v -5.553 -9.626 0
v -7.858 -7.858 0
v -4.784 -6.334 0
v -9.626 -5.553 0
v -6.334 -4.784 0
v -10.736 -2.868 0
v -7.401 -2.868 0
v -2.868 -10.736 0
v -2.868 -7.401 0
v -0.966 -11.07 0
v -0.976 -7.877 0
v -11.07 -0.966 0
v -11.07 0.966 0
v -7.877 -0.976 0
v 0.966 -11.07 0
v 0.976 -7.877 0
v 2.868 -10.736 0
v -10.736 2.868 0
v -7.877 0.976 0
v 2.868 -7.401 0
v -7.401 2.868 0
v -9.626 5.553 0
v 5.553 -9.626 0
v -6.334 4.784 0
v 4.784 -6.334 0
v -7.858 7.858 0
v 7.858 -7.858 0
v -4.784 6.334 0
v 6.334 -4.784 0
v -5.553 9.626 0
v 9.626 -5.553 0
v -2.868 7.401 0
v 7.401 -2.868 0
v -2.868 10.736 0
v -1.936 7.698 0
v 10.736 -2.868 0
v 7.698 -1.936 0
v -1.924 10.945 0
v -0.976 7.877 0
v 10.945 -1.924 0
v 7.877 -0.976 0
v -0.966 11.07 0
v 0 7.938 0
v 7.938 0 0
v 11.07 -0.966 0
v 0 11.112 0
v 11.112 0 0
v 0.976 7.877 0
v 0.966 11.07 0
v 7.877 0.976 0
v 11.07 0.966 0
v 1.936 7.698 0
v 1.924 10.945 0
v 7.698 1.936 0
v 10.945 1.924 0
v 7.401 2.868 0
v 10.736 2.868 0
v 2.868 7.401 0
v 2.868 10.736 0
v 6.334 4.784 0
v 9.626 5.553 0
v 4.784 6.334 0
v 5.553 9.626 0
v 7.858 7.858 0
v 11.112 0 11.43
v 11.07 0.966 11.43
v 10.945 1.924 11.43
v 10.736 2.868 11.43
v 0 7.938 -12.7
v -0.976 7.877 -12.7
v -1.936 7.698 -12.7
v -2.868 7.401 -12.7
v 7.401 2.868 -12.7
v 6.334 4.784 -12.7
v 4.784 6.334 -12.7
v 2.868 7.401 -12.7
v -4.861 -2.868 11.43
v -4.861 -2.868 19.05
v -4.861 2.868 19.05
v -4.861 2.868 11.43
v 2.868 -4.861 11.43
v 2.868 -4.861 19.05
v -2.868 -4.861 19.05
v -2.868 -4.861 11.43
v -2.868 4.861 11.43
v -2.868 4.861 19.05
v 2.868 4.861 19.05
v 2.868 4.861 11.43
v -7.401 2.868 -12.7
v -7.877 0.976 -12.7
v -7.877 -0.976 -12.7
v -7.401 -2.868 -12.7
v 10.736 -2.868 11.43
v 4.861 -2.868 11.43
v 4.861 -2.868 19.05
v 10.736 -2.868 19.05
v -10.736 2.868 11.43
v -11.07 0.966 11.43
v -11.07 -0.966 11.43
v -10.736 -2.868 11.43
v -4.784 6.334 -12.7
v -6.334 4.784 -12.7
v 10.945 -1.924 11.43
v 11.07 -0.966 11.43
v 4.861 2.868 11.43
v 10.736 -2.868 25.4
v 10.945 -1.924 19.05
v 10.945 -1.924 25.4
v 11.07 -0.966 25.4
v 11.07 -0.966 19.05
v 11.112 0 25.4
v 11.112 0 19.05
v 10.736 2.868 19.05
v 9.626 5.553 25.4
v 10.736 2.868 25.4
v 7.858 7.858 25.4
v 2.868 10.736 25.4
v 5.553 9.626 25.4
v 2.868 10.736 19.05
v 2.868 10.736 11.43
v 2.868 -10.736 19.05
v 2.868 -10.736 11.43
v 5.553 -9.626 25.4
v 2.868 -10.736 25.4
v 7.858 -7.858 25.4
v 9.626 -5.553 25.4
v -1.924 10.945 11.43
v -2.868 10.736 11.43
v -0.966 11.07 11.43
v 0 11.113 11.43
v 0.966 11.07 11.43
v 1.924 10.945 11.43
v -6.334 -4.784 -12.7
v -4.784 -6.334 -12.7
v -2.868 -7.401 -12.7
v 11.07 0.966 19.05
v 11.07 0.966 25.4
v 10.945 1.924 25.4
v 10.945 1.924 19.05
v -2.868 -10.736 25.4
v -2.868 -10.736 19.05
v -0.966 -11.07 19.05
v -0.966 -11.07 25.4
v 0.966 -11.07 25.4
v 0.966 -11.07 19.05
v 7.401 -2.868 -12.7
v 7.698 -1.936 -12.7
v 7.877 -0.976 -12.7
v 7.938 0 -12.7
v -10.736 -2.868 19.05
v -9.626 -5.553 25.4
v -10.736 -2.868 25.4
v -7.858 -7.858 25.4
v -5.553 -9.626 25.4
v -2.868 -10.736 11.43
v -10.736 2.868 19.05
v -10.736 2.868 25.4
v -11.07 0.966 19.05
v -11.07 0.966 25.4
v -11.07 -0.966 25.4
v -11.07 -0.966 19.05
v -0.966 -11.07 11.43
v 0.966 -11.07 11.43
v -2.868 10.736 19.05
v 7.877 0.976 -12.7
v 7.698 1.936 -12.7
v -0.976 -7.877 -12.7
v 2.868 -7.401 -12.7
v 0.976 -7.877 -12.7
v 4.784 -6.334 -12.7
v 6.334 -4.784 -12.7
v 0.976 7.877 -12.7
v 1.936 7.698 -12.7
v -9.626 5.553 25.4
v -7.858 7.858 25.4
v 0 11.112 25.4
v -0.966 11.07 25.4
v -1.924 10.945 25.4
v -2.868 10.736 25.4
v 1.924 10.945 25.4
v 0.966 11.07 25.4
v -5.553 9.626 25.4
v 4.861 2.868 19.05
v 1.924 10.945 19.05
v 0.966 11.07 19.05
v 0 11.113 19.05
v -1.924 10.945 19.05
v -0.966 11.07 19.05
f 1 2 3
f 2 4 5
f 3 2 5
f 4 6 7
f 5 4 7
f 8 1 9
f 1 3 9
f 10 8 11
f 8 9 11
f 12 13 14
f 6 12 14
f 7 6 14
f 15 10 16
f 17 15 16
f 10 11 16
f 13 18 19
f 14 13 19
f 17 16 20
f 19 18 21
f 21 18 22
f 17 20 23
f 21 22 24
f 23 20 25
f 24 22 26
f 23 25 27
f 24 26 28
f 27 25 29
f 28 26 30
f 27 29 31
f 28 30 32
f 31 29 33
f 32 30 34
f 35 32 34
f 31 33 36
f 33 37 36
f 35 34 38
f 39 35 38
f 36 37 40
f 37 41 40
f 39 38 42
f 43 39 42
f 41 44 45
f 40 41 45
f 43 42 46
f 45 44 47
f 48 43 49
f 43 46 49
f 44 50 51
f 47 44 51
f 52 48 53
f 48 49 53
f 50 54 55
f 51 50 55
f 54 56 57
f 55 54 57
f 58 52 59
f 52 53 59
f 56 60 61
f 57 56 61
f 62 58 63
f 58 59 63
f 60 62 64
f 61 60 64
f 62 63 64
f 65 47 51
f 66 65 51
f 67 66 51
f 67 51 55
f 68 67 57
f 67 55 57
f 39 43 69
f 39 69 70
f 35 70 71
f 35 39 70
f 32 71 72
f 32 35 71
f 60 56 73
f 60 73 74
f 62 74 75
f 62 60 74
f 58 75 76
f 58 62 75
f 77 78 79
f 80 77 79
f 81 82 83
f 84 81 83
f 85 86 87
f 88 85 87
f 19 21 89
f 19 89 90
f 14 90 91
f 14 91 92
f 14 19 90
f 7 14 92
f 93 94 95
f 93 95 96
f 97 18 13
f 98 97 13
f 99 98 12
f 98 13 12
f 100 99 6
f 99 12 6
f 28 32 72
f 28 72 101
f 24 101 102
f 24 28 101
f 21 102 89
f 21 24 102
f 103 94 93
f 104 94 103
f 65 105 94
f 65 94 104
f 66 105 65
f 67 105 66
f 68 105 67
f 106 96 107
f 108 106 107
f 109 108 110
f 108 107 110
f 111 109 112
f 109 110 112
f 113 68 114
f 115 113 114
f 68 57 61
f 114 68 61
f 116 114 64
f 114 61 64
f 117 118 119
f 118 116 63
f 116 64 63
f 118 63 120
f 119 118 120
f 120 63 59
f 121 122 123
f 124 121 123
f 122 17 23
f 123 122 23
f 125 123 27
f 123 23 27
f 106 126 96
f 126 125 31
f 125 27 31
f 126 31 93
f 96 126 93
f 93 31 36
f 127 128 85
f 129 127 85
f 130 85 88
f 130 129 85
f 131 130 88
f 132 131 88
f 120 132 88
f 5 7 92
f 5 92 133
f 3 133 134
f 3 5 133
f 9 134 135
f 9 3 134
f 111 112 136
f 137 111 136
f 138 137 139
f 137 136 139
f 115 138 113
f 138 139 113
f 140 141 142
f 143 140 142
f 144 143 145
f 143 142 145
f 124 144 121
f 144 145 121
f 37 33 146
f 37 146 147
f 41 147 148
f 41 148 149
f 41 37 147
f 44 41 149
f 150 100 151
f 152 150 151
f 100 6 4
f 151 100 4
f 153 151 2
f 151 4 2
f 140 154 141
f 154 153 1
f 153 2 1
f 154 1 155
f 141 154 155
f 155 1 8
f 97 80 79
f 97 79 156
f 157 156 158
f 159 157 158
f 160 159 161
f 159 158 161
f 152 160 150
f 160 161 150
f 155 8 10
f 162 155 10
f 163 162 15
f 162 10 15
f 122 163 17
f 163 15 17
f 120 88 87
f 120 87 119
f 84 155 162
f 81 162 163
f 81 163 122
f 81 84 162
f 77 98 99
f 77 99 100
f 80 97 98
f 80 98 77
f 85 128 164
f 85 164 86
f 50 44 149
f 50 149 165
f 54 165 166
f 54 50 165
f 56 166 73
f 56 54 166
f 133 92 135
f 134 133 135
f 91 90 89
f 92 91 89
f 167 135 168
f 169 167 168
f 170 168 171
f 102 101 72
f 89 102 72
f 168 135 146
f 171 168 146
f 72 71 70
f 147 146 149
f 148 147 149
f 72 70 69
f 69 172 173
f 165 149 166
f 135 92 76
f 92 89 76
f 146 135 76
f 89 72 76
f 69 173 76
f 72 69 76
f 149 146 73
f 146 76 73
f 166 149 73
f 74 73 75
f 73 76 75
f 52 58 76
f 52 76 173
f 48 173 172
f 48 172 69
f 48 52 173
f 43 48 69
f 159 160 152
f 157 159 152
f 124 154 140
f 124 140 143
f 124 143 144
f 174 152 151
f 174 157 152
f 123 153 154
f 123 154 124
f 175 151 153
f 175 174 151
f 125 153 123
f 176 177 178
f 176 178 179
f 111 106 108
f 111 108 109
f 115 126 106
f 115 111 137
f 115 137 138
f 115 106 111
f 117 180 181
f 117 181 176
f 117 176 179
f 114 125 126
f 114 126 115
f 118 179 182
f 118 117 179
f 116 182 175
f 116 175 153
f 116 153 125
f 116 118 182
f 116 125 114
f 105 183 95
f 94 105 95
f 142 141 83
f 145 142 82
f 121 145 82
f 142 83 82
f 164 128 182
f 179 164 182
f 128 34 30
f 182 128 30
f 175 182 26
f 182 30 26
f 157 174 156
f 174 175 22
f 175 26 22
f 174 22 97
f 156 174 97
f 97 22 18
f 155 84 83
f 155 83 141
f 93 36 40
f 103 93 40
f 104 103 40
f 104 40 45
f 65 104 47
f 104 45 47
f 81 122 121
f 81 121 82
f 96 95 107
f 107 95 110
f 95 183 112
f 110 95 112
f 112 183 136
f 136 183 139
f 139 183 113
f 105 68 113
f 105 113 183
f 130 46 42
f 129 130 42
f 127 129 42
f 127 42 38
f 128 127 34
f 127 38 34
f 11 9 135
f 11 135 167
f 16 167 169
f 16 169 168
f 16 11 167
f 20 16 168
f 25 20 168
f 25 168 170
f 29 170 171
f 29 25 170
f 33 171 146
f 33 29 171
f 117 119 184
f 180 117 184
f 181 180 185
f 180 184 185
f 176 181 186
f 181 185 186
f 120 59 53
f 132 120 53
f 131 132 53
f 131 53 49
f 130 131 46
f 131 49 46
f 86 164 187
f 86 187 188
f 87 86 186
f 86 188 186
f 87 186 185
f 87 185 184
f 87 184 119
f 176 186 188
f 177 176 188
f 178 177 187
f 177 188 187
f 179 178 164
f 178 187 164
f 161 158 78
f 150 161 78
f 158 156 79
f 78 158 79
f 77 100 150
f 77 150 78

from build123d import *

# Parameters (mm, degrees)
F1_DEPTH = 25.4
F2_START = 11.43
F2_DEPTH = 7.62
F3_DEPTH = 12.7


with BuildPart() as f1:
    # F0 (on Top) → F1 (new body)
    with BuildSketch(Plane.XY):
        with BuildLine():
            ThreePointArc((-7.4012664662, 2.8679541395), (-5.6126600757, 5.6126600757), (-2.8679541395, 7.4012664662))
            Line((-2.8679541395, 7.4012664662), (-2.8679541395, 10.7360372253))
            ThreePointArc((-2.8679541395, 10.7360372253), (-7.8577241059, 7.8577241059), (-10.7360372253, 2.8679541395))
            Line((-10.7360372253, 2.8679541395), (-7.4012664662, 2.8679541395))
        make_face()
        with BuildLine():
            ThreePointArc((2.8679541395, 7.4012664662), (5.6126600757, 5.6126600757), (7.4012664662, 2.8679541395))
            Line((7.4012664662, 2.8679541395), (10.7360372253, 2.8679541395))
            ThreePointArc((10.7360372253, 2.8679541395), (7.8577241059, 7.8577241059), (2.8679541395, 10.7360372253))
            Line((2.8679541395, 10.7360372253), (2.8679541395, 7.4012664662))
        make_face()
        with BuildLine():
            Line((10.7360372253, -2.8679541395), (7.4012664662, -2.8679541395))
            ThreePointArc((7.4012664662, -2.8679541395), (5.6126600757, -5.6126600757), (2.8679541395, -7.4012664662))
            Line((2.8679541395, -7.4012664662), (2.8679541395, -10.7360372253))
            ThreePointArc((2.8679541395, -10.7360372253), (7.8577241059, -7.8577241059), (10.7360372253, -2.8679541395))
        make_face()
        with BuildLine():
            Line((-2.8679541395, -10.7360372253), (-2.8679541395, -7.4012664662))
            ThreePointArc((-2.8679541395, -7.4012664662), (-5.6126600757, -5.6126600757), (-7.4012664662, -2.8679541395))
            Line((-7.4012664662, -2.8679541395), (-10.7360372253, -2.8679541395))
            ThreePointArc((-10.7360372253, -2.8679541395), (-7.8577241059, -7.8577241059), (-2.8679541395, -10.7360372253))
        make_face()
        with BuildLine():
            ThreePointArc((-10.7360372253, 2.8679541395), (-11.1125, 0), (-10.7360372253, -2.8679541395))
            Line((-10.7360372253, -2.8679541395), (-10.7360372253, 2.8679541395))
        make_face()
        with BuildLine():
            Line((-10.7360372253, -2.8679541395), (-7.4012664662, -2.8679541395))
            ThreePointArc((-7.4012664662, -2.8679541395), (-7.9375, 0), (-7.4012664662, 2.8679541395))
            Line((-7.4012664662, 2.8679541395), (-10.7360372253, 2.8679541395))
            Line((-10.7360372253, 2.8679541395), (-10.7360372253, -2.8679541395))
        make_face()
        with BuildLine():
            ThreePointArc((-2.8679541395, 7.4012664662), (-1.458827213, 7.8022900108), (0, 7.9375))
            Line((0, 7.9375), (0, 10.7360372253))
            Line((0, 10.7360372253), (-2.8679541395, 10.7360372253))
            Line((-2.8679541395, 10.7360372253), (-2.8679541395, 7.4012664662))
        make_face()
        with BuildLine():
            ThreePointArc((0, 7.9375), (1.458827213, 7.8022900108), (2.8679541395, 7.4012664662))
            Line((2.8679541395, 7.4012664662), (2.8679541395, 10.7360372253))
            Line((2.8679541395, 10.7360372253), (0, 10.7360372253))
            Line((0, 10.7360372253), (0, 7.9375))
        make_face()
        with BuildLine():
            Line((0, 10.7360372253), (2.8679541395, 10.7360372253))
            ThreePointArc((2.8679541395, 10.7360372253), (1.4462784282, 11.0179823452), (0, 11.1125))
            Line((0, 11.1125), (0, 10.7360372253))
        make_face()
        with BuildLine():
            Line((-2.8679541395, 10.7360372253), (0, 10.7360372253))
            Line((0, 10.7360372253), (0, 11.1125))
            ThreePointArc((0, 11.1125), (-1.4462784282, 11.0179823452), (-2.8679541395, 10.7360372253))
        make_face()
        with BuildLine():
            ThreePointArc((7.4012664662, 2.8679541395), (7.8022900108, 1.458827213), (7.9375, 0))
            ThreePointArc((7.9375, 0), (7.8022900108, -1.458827213), (7.4012664662, -2.8679541395))
            Line((7.4012664662, -2.8679541395), (10.7360372253, -2.8679541395))
            Line((10.7360372253, -2.8679541395), (10.7360372253, 2.8679541395))
            Line((10.7360372253, 2.8679541395), (7.4012664662, 2.8679541395))
        make_face()
        with BuildLine():
            ThreePointArc((11.1125, 0), (11.0179823452, 1.4462784282), (10.7360372253, 2.8679541395))
            Line((10.7360372253, 2.8679541395), (10.7360372253, -2.8679541395))
            ThreePointArc((10.7360372253, -2.8679541395), (11.0179823452, -1.4462784282), (11.1125, 0))
        make_face()
        with BuildLine():
            Line((2.8679541395, -10.7360372253), (2.8679541395, -7.4012664662))
            ThreePointArc((2.8679541395, -7.4012664662), (0, -7.9375), (-2.8679541395, -7.4012664662))
            Line((-2.8679541395, -7.4012664662), (-2.8679541395, -10.7360372253))
            Line((-2.8679541395, -10.7360372253), (2.8679541395, -10.7360372253))
        make_face()
        with BuildLine():
            ThreePointArc((-2.8679541395, -10.7360372253), (0, -11.1125), (2.8679541395, -10.7360372253))
            Line((2.8679541395, -10.7360372253), (-2.8679541395, -10.7360372253))
        make_face()
        with BuildLine():
            Line((4.8612664662, 2.8679541395), (7.4012664662, 2.8679541395))
            ThreePointArc((7.4012664662, 2.8679541395), (5.6126600757, 5.6126600757), (2.8679541395, 7.4012664662))
            Line((2.8679541395, 7.4012664662), (2.8679541395, 4.8612664662))
            Line((2.8679541395, 4.8612664662), (0, 4.8612664662))
            Line((0, 4.8612664662), (-2.8679541395, 4.8612664662))
            Line((-2.8679541395, 4.8612664662), (-2.8679541395, 7.4012664662))
            ThreePointArc((-2.8679541395, 7.4012664662), (-5.6126600757, 5.6126600757), (-7.4012664662, 2.8679541395))
            Line((-7.4012664662, 2.8679541395), (-4.8612664662, 2.8679541395))
            Line((-4.8612664662, 2.8679541395), (-4.8612664662, -2.8679541395))
            Line((-4.8612664662, -2.8679541395), (-7.4012664662, -2.8679541395))
            ThreePointArc((-7.4012664662, -2.8679541395), (-5.6126600757, -5.6126600757), (-2.8679541395, -7.4012664662))
            Line((-2.8679541395, -7.4012664662), (-2.8679541395, -4.8612664662))
            Line((-2.8679541395, -4.8612664662), (2.8679541395, -4.8612664662))
            Line((2.8679541395, -4.8612664662), (2.8679541395, -7.4012664662))
            ThreePointArc((2.8679541395, -7.4012664662), (5.6126600757, -5.6126600757), (7.4012664662, -2.8679541395))
            Line((7.4012664662, -2.8679541395), (4.8612664662, -2.8679541395))
            Line((4.8612664662, -2.8679541395), (4.8612664662, 2.8679541395))
        make_face()
        with BuildLine():
            ThreePointArc((7.4012664662, -2.8679541395), (7.8022900108, -1.458827213), (7.9375, 0))
            ThreePointArc((7.9375, 0), (7.8022900108, 1.458827213), (7.4012664662, 2.8679541395))
            Line((7.4012664662, 2.8679541395), (4.8612664662, 2.8679541395))
            Line((4.8612664662, 2.8679541395), (4.8612664662, -2.8679541395))
            Line((4.8612664662, -2.8679541395), (7.4012664662, -2.8679541395))
        make_face()
        with BuildLine():
            Line((0, 4.8612664662), (0, 7.9375))
            ThreePointArc((0, 7.9375), (-1.458827213, 7.8022900108), (-2.8679541395, 7.4012664662))
            Line((-2.8679541395, 7.4012664662), (-2.8679541395, 4.8612664662))
            Line((-2.8679541395, 4.8612664662), (0, 4.8612664662))
        make_face()
        with BuildLine():
            ThreePointArc((-7.4012664662, 2.8679541395), (-7.9375, 0), (-7.4012664662, -2.8679541395))
            Line((-7.4012664662, -2.8679541395), (-4.8612664662, -2.8679541395))
            Line((-4.8612664662, -2.8679541395), (-4.8612664662, 2.8679541395))
            Line((-4.8612664662, 2.8679541395), (-7.4012664662, 2.8679541395))
        make_face()
        with BuildLine():
            Line((2.8679541395, 4.8612664662), (2.8679541395, 7.4012664662))
            ThreePointArc((2.8679541395, 7.4012664662), (1.458827213, 7.8022900108), (0, 7.9375))
            Line((0, 7.9375), (0, 4.8612664662))
            Line((0, 4.8612664662), (2.8679541395, 4.8612664662))
        make_face()
        with BuildLine():
            ThreePointArc((-2.8679541395, -7.4012664662), (0, -7.9375), (2.8679541395, -7.4012664662))
            Line((2.8679541395, -7.4012664662), (2.8679541395, -4.8612664662))
            Line((2.8679541395, -4.8612664662), (-2.8679541395, -4.8612664662))
            Line((-2.8679541395, -4.8612664662), (-2.8679541395, -7.4012664662))
        make_face()
    extrude(amount=F1_DEPTH)

    # F0 (on Top) → F2 (cut)
    with BuildSketch(Plane.XY.offset(F2_START)):
        with BuildLine():
            ThreePointArc((-2.8679541395, -10.7360372253), (0, -11.1125), (2.8679541395, -10.7360372253))
            Line((2.8679541395, -10.7360372253), (-2.8679541395, -10.7360372253))
        make_face()
        with BuildLine():
            Line((2.8679541395, -10.7360372253), (2.8679541395, -7.4012664662))
            ThreePointArc((2.8679541395, -7.4012664662), (0, -7.9375), (-2.8679541395, -7.4012664662))
            Line((-2.8679541395, -7.4012664662), (-2.8679541395, -10.7360372253))
            Line((-2.8679541395, -10.7360372253), (2.8679541395, -10.7360372253))
        make_face()
        with BuildLine():
            Line((-10.7360372253, -2.8679541395), (-7.4012664662, -2.8679541395))
            ThreePointArc((-7.4012664662, -2.8679541395), (-7.9375, 0), (-7.4012664662, 2.8679541395))
            Line((-7.4012664662, 2.8679541395), (-10.7360372253, 2.8679541395))
            Line((-10.7360372253, 2.8679541395), (-10.7360372253, -2.8679541395))
        make_face()
        with BuildLine():
            ThreePointArc((-10.7360372253, 2.8679541395), (-11.1125, 0), (-10.7360372253, -2.8679541395))
            Line((-10.7360372253, -2.8679541395), (-10.7360372253, 2.8679541395))
        make_face()
        with BuildLine():
            ThreePointArc((7.4012664662, 2.8679541395), (7.8022900108, 1.458827213), (7.9375, 0))
            ThreePointArc((7.9375, 0), (7.8022900108, -1.458827213), (7.4012664662, -2.8679541395))
            Line((7.4012664662, -2.8679541395), (10.7360372253, -2.8679541395))
            Line((10.7360372253, -2.8679541395), (10.7360372253, 2.8679541395))
            Line((10.7360372253, 2.8679541395), (7.4012664662, 2.8679541395))
        make_face()
        with BuildLine():
            ThreePointArc((11.1125, 0), (11.0179823452, 1.4462784282), (10.7360372253, 2.8679541395))
            Line((10.7360372253, 2.8679541395), (10.7360372253, -2.8679541395))
            ThreePointArc((10.7360372253, -2.8679541395), (11.0179823452, -1.4462784282), (11.1125, 0))
        make_face()
        with BuildLine():
            ThreePointArc((0, 7.9375), (1.458827213, 7.8022900108), (2.8679541395, 7.4012664662))
            Line((2.8679541395, 7.4012664662), (2.8679541395, 10.7360372253))
            Line((2.8679541395, 10.7360372253), (0, 10.7360372253))
            Line((0, 10.7360372253), (0, 7.9375))
        make_face()
        with BuildLine():
            Line((0, 10.7360372253), (2.8679541395, 10.7360372253))
            ThreePointArc((2.8679541395, 10.7360372253), (1.4462784282, 11.0179823452), (0, 11.1125))
            Line((0, 11.1125), (0, 10.7360372253))
        make_face()
        with BuildLine():
            ThreePointArc((-2.8679541395, 7.4012664662), (-1.458827213, 7.8022900108), (0, 7.9375))
            Line((0, 7.9375), (0, 10.7360372253))
            Line((0, 10.7360372253), (-2.8679541395, 10.7360372253))
            Line((-2.8679541395, 10.7360372253), (-2.8679541395, 7.4012664662))
        make_face()
        with BuildLine():
            Line((-2.8679541395, 10.7360372253), (0, 10.7360372253))
            Line((0, 10.7360372253), (0, 11.1125))
            ThreePointArc((0, 11.1125), (-1.4462784282, 11.0179823452), (-2.8679541395, 10.7360372253))
        make_face()
        with BuildLine():
            ThreePointArc((-2.8679541395, -7.4012664662), (0, -7.9375), (2.8679541395, -7.4012664662))
            Line((2.8679541395, -7.4012664662), (2.8679541395, -4.8612664662))
            Line((2.8679541395, -4.8612664662), (-2.8679541395, -4.8612664662))
            Line((-2.8679541395, -4.8612664662), (-2.8679541395, -7.4012664662))
        make_face()
        with BuildLine():
            ThreePointArc((-7.4012664662, 2.8679541395), (-7.9375, 0), (-7.4012664662, -2.8679541395))
            Line((-7.4012664662, -2.8679541395), (-4.8612664662, -2.8679541395))
            Line((-4.8612664662, -2.8679541395), (-4.8612664662, 2.8679541395))
            Line((-4.8612664662, 2.8679541395), (-7.4012664662, 2.8679541395))
        make_face()
        with BuildLine():
            Line((0, 4.8612664662), (0, 7.9375))
            ThreePointArc((0, 7.9375), (-1.458827213, 7.8022900108), (-2.8679541395, 7.4012664662))
            Line((-2.8679541395, 7.4012664662), (-2.8679541395, 4.8612664662))
            Line((-2.8679541395, 4.8612664662), (0, 4.8612664662))
        make_face()
        with BuildLine():
            Line((2.8679541395, 4.8612664662), (2.8679541395, 7.4012664662))
            ThreePointArc((2.8679541395, 7.4012664662), (1.458827213, 7.8022900108), (0, 7.9375))
            Line((0, 7.9375), (0, 4.8612664662))
            Line((0, 4.8612664662), (2.8679541395, 4.8612664662))
        make_face()
        with BuildLine():
            ThreePointArc((7.4012664662, -2.8679541395), (7.8022900108, -1.458827213), (7.9375, 0))
            ThreePointArc((7.9375, 0), (7.8022900108, 1.458827213), (7.4012664662, 2.8679541395))
            Line((7.4012664662, 2.8679541395), (4.8612664662, 2.8679541395))
            Line((4.8612664662, 2.8679541395), (4.8612664662, -2.8679541395))
            Line((4.8612664662, -2.8679541395), (7.4012664662, -2.8679541395))
        make_face()
    extrude(amount=F2_DEPTH, mode=Mode.SUBTRACT)

    # F0 (on Top) → F3 (join)
    with BuildSketch(Plane.XY):
        with BuildLine():
            Line((4.8612664662, 2.8679541395), (7.4012664662, 2.8679541395))
            ThreePointArc((7.4012664662, 2.8679541395), (5.6126600757, 5.6126600757), (2.8679541395, 7.4012664662))
            Line((2.8679541395, 7.4012664662), (2.8679541395, 4.8612664662))
            Line((2.8679541395, 4.8612664662), (0, 4.8612664662))
            Line((0, 4.8612664662), (-2.8679541395, 4.8612664662))
            Line((-2.8679541395, 4.8612664662), (-2.8679541395, 7.4012664662))
            ThreePointArc((-2.8679541395, 7.4012664662), (-5.6126600757, 5.6126600757), (-7.4012664662, 2.8679541395))
            Line((-7.4012664662, 2.8679541395), (-4.8612664662, 2.8679541395))
            Line((-4.8612664662, 2.8679541395), (-4.8612664662, -2.8679541395))
            Line((-4.8612664662, -2.8679541395), (-7.4012664662, -2.8679541395))
            ThreePointArc((-7.4012664662, -2.8679541395), (-5.6126600757, -5.6126600757), (-2.8679541395, -7.4012664662))
            Line((-2.8679541395, -7.4012664662), (-2.8679541395, -4.8612664662))
            Line((-2.8679541395, -4.8612664662), (2.8679541395, -4.8612664662))
            Line((2.8679541395, -4.8612664662), (2.8679541395, -7.4012664662))
            ThreePointArc((2.8679541395, -7.4012664662), (5.6126600757, -5.6126600757), (7.4012664662, -2.8679541395))
            Line((7.4012664662, -2.8679541395), (4.8612664662, -2.8679541395))
            Line((4.8612664662, -2.8679541395), (4.8612664662, 2.8679541395))
        make_face()
        with BuildLine():
            ThreePointArc((-2.8679541395, -7.4012664662), (0, -7.9375), (2.8679541395, -7.4012664662))
            Line((2.8679541395, -7.4012664662), (2.8679541395, -4.8612664662))
            Line((2.8679541395, -4.8612664662), (-2.8679541395, -4.8612664662))
            Line((-2.8679541395, -4.8612664662), (-2.8679541395, -7.4012664662))
        make_face()
        with BuildLine():
            ThreePointArc((7.4012664662, -2.8679541395), (7.8022900108, -1.458827213), (7.9375, 0))
            ThreePointArc((7.9375, 0), (7.8022900108, 1.458827213), (7.4012664662, 2.8679541395))
            Line((7.4012664662, 2.8679541395), (4.8612664662, 2.8679541395))
            Line((4.8612664662, 2.8679541395), (4.8612664662, -2.8679541395))
            Line((4.8612664662, -2.8679541395), (7.4012664662, -2.8679541395))
        make_face()
        with BuildLine():
            Line((2.8679541395, 4.8612664662), (2.8679541395, 7.4012664662))
            ThreePointArc((2.8679541395, 7.4012664662), (1.458827213, 7.8022900108), (0, 7.9375))
            Line((0, 7.9375), (0, 4.8612664662))
            Line((0, 4.8612664662), (2.8679541395, 4.8612664662))
        make_face()
        with BuildLine():
            Line((0, 4.8612664662), (0, 7.9375))
            ThreePointArc((0, 7.9375), (-1.458827213, 7.8022900108), (-2.8679541395, 7.4012664662))
            Line((-2.8679541395, 7.4012664662), (-2.8679541395, 4.8612664662))
            Line((-2.8679541395, 4.8612664662), (0, 4.8612664662))
        make_face()
        with BuildLine():
            ThreePointArc((-7.4012664662, 2.8679541395), (-7.9375, 0), (-7.4012664662, -2.8679541395))
            Line((-7.4012664662, -2.8679541395), (-4.8612664662, -2.8679541395))
            Line((-4.8612664662, -2.8679541395), (-4.8612664662, 2.8679541395))
            Line((-4.8612664662, 2.8679541395), (-7.4012664662, 2.8679541395))
        make_face()
    extrude(amount=-F3_DEPTH)


solid = f1.part
